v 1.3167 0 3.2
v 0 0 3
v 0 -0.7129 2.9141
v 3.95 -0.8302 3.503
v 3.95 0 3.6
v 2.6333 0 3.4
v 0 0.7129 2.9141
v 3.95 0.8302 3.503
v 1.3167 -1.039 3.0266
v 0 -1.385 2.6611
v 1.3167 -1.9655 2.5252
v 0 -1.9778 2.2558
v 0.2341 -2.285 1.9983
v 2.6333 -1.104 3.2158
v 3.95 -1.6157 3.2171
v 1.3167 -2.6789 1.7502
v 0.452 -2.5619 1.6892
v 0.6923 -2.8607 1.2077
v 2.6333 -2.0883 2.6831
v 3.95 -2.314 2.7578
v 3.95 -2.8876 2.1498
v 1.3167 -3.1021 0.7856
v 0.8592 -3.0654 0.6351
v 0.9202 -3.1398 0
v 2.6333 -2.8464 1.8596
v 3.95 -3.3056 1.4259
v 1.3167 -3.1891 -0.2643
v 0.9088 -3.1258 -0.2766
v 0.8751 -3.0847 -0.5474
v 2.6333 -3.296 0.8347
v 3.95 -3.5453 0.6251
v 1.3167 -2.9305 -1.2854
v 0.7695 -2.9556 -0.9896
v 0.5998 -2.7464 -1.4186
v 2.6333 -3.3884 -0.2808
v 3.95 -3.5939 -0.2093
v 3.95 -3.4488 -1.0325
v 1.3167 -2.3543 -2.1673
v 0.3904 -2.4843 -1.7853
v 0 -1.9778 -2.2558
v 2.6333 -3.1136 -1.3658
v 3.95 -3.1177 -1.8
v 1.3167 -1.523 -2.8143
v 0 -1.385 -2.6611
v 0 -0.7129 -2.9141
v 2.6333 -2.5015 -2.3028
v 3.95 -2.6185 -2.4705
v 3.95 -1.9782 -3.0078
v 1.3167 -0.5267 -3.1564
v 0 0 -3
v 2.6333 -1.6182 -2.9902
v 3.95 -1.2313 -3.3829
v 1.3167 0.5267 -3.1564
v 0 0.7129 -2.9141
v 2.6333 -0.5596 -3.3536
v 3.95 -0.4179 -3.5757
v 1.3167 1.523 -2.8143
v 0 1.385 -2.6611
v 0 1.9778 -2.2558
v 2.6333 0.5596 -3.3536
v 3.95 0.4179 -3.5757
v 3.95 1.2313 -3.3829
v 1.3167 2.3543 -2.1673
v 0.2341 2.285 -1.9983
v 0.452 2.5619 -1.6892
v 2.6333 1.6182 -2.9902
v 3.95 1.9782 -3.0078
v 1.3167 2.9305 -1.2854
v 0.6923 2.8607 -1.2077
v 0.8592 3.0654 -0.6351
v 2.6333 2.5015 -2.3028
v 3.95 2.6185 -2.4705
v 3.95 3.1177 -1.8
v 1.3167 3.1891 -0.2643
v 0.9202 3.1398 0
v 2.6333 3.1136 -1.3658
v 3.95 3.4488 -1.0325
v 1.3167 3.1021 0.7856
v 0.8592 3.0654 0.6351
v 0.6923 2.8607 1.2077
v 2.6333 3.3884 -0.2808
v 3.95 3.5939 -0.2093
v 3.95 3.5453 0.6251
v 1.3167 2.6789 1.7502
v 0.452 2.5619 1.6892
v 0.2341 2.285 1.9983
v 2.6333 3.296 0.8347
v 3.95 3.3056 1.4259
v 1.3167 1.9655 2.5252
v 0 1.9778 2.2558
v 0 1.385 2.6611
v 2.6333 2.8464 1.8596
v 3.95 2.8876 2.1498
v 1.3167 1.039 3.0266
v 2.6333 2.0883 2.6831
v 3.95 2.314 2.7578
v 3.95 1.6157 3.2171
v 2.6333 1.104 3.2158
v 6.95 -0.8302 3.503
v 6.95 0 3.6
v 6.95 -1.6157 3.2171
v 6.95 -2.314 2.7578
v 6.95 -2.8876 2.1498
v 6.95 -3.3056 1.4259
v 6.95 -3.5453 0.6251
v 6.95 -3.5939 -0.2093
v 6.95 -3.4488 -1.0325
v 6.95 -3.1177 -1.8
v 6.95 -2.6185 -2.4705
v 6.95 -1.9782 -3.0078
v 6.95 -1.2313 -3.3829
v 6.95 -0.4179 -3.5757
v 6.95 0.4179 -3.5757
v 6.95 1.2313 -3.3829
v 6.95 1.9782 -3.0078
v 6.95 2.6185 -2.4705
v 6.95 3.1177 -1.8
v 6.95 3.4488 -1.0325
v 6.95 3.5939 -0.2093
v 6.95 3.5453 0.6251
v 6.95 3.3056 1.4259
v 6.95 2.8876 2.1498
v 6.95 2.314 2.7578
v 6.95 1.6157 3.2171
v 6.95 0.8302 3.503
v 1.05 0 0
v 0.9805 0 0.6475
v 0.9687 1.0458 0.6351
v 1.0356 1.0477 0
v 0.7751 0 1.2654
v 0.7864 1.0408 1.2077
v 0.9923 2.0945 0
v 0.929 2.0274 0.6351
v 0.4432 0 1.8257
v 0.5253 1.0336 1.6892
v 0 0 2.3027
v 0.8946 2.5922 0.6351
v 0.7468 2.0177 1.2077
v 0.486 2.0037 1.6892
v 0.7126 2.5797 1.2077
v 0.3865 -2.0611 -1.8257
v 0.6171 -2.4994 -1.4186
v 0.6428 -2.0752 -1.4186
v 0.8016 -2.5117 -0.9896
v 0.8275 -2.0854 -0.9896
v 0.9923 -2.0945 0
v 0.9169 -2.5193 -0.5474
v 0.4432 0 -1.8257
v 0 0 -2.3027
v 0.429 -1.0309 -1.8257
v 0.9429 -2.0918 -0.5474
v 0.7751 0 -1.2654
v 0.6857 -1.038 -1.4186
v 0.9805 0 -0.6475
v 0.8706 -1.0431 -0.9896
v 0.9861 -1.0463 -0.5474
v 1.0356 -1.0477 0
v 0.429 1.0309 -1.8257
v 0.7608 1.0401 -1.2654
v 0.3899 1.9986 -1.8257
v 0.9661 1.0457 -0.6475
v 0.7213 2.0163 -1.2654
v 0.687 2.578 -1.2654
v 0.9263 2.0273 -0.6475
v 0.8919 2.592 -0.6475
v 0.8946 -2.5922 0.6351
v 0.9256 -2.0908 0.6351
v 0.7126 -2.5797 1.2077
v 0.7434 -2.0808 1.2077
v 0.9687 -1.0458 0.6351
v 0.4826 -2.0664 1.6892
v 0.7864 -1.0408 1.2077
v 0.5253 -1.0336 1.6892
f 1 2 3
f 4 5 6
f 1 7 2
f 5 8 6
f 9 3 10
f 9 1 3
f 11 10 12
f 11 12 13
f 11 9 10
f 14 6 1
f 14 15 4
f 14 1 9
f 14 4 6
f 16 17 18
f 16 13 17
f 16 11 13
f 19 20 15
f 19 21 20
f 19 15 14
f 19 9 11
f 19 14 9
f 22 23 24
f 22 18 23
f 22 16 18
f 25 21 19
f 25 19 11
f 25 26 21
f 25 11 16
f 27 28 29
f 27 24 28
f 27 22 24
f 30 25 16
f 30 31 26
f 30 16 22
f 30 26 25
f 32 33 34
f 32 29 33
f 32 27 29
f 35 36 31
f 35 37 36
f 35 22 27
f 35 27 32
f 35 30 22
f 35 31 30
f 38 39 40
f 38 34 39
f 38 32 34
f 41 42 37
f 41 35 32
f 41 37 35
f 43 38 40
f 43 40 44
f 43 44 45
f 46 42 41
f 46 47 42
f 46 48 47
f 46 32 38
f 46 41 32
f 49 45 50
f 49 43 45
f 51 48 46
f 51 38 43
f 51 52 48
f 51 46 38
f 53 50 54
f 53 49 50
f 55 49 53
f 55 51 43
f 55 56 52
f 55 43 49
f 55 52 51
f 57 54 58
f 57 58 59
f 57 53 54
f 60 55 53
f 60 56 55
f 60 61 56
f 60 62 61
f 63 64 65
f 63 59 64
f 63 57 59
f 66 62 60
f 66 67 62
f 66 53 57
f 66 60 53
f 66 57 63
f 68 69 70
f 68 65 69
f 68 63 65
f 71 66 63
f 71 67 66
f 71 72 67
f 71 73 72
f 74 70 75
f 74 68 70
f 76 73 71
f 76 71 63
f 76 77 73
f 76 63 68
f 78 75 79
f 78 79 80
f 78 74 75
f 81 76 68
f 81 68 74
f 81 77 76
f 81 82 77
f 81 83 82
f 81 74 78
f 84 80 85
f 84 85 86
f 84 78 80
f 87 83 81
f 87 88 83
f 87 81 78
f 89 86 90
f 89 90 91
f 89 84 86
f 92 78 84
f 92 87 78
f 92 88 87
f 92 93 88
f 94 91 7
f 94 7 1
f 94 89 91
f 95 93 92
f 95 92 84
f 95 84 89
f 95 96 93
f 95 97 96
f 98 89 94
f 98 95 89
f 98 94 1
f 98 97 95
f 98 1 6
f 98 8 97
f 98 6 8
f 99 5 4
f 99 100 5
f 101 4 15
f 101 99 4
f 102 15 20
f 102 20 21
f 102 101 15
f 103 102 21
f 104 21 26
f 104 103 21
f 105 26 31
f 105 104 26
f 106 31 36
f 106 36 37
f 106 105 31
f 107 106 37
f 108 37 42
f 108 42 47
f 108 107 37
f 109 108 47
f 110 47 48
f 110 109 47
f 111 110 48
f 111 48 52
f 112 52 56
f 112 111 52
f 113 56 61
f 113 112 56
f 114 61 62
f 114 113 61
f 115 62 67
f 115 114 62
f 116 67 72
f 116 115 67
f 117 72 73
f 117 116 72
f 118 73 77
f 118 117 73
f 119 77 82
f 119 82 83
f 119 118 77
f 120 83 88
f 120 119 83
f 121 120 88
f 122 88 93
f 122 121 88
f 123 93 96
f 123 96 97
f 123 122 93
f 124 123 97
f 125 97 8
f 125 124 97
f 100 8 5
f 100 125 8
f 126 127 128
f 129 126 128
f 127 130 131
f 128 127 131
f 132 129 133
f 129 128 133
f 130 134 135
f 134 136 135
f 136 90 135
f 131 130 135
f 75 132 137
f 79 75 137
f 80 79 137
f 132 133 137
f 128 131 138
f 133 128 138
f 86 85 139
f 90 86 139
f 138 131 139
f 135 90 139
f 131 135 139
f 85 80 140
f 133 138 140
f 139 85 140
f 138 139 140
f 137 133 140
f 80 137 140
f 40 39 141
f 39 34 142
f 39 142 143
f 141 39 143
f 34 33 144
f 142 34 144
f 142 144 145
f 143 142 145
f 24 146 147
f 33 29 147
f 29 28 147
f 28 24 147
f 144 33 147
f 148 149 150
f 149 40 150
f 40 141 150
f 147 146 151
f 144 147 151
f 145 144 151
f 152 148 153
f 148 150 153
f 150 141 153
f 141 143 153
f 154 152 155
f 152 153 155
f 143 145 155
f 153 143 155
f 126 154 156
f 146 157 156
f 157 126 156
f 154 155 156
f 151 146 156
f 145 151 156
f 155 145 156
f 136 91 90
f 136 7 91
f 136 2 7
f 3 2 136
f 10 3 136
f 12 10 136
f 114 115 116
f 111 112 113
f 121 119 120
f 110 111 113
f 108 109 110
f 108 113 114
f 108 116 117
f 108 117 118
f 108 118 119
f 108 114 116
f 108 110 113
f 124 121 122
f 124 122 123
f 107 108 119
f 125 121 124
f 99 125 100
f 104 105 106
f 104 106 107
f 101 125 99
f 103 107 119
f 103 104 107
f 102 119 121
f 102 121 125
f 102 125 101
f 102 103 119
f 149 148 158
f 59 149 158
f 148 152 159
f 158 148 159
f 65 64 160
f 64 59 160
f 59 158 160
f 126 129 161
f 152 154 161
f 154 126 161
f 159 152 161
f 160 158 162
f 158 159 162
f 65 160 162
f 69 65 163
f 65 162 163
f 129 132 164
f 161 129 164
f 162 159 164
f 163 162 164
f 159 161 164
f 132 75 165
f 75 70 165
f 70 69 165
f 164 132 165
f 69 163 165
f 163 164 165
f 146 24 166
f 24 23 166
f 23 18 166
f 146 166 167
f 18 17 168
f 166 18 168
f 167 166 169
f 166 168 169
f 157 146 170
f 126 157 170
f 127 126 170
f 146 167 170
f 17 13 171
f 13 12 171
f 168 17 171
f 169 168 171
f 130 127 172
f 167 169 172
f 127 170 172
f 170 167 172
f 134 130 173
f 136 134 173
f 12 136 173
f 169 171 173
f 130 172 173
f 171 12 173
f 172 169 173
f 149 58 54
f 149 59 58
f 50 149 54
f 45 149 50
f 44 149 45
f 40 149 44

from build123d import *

# Parameters (mm, degrees)
SKETCH001_R = 3.05


with BuildPart() as part:
    # Sketch → Revolution (revolve)
    with BuildSketch(Plane.XZ):
        Polygon((0, 0), (0, 3), (3.95, 3.6), (6.95, 3.6), (6.95, 0), align=None)
    revolve(axis=Axis((0, 0, 0), (1, 0, 0)))

    # Sketch001 → Groove (revolve, cut)
    with BuildSketch(Plane.XZ):
        with Locations((-2, 0)):
            Circle(SKETCH001_R)
    revolve(axis=Axis((-37, 0, 0), (0, 0, 1)), mode=Mode.SUBTRACT)


solid = part.part
